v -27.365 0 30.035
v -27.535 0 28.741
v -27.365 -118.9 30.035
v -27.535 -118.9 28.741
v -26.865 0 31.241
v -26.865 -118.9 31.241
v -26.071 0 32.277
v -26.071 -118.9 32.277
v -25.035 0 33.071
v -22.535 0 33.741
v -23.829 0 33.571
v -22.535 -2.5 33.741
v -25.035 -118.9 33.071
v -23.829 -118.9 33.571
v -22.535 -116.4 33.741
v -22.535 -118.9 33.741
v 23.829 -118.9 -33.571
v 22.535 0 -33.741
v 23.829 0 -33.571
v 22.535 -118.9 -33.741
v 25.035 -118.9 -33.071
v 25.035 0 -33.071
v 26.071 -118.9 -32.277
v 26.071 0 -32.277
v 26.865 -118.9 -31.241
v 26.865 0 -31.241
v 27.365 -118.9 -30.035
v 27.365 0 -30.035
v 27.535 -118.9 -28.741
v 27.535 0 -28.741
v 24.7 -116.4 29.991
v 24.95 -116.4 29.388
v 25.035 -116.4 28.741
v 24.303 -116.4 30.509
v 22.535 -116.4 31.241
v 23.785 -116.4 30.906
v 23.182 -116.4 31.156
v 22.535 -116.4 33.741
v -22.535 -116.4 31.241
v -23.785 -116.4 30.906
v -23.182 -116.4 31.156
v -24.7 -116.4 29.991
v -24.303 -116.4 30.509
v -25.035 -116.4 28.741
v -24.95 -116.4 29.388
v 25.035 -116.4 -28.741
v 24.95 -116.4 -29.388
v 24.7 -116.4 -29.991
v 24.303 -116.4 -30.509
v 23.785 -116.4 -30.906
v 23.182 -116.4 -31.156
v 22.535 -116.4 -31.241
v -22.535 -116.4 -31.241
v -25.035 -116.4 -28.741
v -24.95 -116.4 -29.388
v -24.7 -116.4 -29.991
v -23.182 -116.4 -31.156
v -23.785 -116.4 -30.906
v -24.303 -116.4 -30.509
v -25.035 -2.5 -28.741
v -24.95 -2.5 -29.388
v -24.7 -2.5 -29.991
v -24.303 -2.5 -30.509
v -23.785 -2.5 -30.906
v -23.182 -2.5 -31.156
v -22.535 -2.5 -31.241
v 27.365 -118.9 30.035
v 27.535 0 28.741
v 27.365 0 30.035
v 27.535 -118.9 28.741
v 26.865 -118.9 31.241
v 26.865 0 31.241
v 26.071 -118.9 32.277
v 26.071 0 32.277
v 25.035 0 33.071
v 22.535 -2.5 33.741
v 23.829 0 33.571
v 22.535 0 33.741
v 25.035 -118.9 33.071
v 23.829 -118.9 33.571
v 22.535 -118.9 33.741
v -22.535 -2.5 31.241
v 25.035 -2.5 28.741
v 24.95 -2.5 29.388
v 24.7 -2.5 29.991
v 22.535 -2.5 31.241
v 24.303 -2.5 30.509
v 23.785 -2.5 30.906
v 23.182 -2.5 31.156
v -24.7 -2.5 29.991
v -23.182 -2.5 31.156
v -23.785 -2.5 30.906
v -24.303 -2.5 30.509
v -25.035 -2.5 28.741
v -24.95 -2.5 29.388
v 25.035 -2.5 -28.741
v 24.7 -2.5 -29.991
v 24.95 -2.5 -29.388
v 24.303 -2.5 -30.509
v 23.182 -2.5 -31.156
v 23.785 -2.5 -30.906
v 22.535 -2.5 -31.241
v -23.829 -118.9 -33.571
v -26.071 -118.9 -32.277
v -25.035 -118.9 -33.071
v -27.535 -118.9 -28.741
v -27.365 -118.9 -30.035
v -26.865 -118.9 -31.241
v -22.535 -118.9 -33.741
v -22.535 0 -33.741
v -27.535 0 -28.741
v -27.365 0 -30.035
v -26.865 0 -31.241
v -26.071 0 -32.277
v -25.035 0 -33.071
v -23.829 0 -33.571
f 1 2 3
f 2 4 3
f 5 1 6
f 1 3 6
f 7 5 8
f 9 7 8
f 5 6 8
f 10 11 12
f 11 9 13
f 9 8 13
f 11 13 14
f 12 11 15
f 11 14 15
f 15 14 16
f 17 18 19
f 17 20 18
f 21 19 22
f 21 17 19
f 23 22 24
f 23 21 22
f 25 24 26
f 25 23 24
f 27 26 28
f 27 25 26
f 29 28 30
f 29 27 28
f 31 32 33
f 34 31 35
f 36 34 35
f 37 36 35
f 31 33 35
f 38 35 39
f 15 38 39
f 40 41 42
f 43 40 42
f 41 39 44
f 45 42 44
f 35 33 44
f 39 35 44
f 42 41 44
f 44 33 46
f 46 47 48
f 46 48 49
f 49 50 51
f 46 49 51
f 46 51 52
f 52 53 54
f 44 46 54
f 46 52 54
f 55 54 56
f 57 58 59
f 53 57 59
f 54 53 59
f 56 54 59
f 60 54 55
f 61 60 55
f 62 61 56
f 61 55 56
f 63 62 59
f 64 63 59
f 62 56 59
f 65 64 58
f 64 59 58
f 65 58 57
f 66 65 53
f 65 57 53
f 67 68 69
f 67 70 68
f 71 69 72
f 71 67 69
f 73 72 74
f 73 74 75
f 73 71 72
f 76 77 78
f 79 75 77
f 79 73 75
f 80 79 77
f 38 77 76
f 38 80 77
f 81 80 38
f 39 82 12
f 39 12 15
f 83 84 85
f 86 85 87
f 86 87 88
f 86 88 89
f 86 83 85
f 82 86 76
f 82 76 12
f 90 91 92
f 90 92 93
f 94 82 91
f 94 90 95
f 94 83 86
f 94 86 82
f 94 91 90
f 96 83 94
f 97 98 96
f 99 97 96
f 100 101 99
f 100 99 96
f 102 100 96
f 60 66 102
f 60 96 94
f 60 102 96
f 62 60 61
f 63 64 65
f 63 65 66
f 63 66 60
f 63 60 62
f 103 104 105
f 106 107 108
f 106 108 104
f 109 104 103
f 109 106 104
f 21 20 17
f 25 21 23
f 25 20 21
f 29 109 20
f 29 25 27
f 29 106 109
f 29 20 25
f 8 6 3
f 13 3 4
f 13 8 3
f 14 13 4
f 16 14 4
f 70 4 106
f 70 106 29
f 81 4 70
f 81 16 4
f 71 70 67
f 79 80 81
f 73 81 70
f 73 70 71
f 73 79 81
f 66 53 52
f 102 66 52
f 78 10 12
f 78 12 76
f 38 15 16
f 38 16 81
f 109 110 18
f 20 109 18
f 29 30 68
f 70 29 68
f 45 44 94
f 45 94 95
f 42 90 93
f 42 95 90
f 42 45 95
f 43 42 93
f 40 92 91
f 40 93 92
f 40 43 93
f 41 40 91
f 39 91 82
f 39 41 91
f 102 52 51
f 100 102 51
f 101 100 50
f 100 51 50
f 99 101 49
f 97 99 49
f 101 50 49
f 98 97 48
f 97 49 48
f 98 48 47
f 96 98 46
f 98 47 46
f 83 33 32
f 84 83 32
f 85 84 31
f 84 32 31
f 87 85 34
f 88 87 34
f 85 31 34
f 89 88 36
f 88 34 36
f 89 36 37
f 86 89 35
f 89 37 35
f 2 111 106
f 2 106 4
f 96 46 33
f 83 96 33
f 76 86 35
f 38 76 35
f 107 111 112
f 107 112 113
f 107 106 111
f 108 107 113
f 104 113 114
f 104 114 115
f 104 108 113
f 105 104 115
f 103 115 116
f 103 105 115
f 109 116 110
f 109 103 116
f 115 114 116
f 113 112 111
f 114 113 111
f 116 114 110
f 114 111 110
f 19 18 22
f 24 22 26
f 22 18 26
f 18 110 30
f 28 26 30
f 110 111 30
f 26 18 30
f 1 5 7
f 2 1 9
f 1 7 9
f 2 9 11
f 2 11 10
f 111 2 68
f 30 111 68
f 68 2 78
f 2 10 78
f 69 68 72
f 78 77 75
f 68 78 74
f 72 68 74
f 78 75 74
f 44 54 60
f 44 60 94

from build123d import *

# Parameters (mm, degrees)
F0_W     = 55.0703965127
F0_H     = 67.4825981259
F1_DEPTH = 118.9
F2_R     = 5
F3_T     = -2.5


# Not quite as in the source:
# - a shell that OpenCascade refuses in one call is made with other operations: the cavity is built on its own and cut out


with BuildPart() as f1:
    # F0 (on Front) → F1 (new body)
    with BuildSketch(Plane.XZ):
        Rectangle(F0_W, F0_H)
    extrude(amount=F1_DEPTH)

    # F2
    f2_edges = [f1.edges().sort_by_distance(p)[0] for p in [
        (-27.535198, -59.45, 33.741299),
        (27.535198, -59.45, 33.741299),
        (-27.535198, -59.45, -33.741299),
        (27.535198, -59.45, -33.741299),
    ]]
    fillet(f2_edges, radius=F2_R)

    # F3: a shell. OpenCascade refuses it in one call, so the cavity is built on its own and cut out:
    # the body offset inwards by the wall thickness, plus a prism from it out through each open face.
    f3_core = offset(f1.part, amount=F3_T, mode=Mode.PRIVATE)
    f3_exits = [f3_core.faces().sort_by_distance(p)[0] for p in [
        (0, -59.45, 31.241299),
    ]]
    add(f3_core, mode=Mode.SUBTRACT)
    extrude(f3_exits, amount=-F3_T, mode=Mode.SUBTRACT)


solid = f1.part
